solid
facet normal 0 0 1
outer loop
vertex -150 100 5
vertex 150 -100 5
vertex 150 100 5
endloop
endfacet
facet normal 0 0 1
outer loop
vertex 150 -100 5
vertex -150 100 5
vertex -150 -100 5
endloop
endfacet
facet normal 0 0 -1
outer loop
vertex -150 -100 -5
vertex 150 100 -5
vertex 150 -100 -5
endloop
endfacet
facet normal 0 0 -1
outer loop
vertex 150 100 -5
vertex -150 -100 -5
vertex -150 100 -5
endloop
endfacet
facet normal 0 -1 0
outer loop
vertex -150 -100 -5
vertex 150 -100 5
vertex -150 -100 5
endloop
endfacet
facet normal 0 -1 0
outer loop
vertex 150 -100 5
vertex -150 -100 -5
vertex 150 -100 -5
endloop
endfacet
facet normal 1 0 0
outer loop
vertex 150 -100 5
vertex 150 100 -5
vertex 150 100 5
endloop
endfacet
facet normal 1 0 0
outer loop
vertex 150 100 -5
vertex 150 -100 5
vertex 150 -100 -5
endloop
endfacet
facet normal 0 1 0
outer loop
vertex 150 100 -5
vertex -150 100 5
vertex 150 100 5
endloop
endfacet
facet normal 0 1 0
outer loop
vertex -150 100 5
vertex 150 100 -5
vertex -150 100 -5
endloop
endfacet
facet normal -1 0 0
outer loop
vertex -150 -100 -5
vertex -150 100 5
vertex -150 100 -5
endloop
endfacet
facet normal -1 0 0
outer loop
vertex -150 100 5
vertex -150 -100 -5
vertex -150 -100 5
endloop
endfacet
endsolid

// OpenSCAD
// Parameters
plate_L = 300; //[150:600:1]
plate_W = 200; //[100:400:1]
plate_T = 10; //[5:20:1]
eps = 1; //[0.5:2:0.1]

// Main plate body
module plate_body() {
  color("Silver")
  translate([0, 0, 0])
    cube([plate_L, plate_W, plate_T], center=true);
}

// Edge chamfer placeholder (no-op)
module edge_chamfer() {
  // Placeholder for chamfer, no geometry change
}

// Corner radius placeholder (no-op)
module corner_radius() {
  // Placeholder for corner radius, no geometry change
}

// Surface finish marking placeholder (no-op)
module surface_finish_marking() {
  // Placeholder for surface finish marking, no geometry change
}

// Engraved label placeholder (no-op)
module engraved_label() {
  // Placeholder for engraved label, no geometry change
}

// Complete plate assembly
module plate_complete() {
  union() {
    plate_body();
    edge_chamfer();
    corner_radius();
    surface_finish_marking();
    engraved_label();
  }
}

// Render the final output
plate_complete();
